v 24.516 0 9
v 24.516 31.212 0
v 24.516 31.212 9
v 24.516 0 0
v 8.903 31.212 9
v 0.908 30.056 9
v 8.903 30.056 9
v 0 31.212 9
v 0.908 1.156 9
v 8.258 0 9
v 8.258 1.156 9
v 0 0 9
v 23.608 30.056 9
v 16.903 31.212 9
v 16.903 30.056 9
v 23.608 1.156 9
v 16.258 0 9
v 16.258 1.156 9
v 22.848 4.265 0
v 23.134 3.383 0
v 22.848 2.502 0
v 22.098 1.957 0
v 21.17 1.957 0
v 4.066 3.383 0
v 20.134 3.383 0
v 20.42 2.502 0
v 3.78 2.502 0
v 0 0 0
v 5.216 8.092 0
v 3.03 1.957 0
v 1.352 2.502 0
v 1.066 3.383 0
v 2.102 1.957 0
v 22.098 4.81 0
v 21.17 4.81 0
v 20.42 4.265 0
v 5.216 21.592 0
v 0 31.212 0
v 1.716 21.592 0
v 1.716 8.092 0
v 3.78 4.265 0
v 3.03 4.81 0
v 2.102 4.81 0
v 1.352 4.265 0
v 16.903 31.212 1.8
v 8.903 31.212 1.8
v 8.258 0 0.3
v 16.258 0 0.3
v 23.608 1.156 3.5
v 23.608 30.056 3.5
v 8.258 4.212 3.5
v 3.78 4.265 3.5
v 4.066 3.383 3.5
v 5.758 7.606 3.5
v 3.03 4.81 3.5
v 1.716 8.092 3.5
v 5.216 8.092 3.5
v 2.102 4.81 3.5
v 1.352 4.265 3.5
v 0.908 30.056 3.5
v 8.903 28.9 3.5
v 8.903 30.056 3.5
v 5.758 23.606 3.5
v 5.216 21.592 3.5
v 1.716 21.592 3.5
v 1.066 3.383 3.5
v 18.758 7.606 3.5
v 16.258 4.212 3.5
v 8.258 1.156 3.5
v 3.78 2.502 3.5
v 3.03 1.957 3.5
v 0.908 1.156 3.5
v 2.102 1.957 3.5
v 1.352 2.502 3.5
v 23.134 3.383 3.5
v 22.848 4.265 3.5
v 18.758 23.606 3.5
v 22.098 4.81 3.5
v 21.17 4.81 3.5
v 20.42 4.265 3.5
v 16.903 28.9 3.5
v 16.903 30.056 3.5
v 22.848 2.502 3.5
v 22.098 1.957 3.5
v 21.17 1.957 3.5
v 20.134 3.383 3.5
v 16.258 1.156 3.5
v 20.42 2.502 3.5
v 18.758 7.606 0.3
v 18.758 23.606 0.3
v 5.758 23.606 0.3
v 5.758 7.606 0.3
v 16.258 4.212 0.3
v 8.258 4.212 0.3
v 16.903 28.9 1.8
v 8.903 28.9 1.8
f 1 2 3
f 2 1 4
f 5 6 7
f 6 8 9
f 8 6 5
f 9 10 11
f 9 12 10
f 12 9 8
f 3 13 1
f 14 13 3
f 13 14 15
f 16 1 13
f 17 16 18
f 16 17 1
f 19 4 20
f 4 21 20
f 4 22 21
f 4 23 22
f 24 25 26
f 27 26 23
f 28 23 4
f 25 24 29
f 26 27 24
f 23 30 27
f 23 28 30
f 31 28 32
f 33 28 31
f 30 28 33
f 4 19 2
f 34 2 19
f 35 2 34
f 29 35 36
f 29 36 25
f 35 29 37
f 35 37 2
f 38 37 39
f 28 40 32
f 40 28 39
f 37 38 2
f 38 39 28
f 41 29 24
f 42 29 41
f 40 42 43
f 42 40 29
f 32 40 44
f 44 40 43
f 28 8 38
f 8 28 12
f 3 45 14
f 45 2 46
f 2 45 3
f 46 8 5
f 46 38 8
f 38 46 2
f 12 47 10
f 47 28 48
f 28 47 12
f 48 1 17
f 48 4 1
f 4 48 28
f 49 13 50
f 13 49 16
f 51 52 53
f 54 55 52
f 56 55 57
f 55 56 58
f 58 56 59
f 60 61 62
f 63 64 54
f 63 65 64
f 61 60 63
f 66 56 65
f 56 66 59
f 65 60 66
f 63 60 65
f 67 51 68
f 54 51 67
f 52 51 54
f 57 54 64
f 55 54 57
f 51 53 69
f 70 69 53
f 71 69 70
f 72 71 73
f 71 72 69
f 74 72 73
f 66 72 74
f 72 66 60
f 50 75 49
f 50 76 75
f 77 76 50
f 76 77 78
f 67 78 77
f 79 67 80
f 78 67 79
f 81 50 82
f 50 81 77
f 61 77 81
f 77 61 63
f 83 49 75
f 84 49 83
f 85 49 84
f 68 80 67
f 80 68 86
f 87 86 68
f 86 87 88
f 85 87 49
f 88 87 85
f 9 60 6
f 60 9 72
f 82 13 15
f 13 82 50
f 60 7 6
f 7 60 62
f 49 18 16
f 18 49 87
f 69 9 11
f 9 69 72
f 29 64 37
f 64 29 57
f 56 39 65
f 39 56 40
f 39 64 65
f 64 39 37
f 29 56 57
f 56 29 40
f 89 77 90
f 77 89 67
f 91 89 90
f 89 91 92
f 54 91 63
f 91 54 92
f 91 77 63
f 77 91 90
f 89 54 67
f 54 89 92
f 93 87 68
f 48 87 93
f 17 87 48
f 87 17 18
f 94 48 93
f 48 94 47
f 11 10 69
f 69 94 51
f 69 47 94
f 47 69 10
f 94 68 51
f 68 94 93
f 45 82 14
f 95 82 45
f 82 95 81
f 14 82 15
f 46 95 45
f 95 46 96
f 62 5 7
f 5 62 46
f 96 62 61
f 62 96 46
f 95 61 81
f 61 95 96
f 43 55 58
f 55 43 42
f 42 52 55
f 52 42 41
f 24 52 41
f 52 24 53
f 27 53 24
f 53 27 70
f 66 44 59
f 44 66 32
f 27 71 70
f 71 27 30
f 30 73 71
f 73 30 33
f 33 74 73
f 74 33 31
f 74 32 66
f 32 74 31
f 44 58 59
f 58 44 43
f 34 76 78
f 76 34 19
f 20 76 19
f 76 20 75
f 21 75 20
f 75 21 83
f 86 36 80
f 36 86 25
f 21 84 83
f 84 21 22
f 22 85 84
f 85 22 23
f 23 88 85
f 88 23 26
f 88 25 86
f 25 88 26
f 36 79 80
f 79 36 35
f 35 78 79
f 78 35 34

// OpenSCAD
//21.55x28.01
w=22.7;
h=28.9;
z=9;
rim=0.08;
text="ftl";
fontsize=10;

difference() {
 cube([w*(1+rim),h*(1+rim),z]);

// filler    
 translate([w*rim/2,h*rim/2,3.5]){
  cube([w,h,z]);
 }    

// pin seat
 pinseatw=3.5;
 pinseath=13.5;
 translate([w*rim-0.1, h*rim*3.5, 0]){
  cube([pinseatw,pinseath,z]);
 }    

// ESP seat
 seatw=13;
 seath=16;
 translate([(w*(1+rim)/2)-(seatw/2),(h*(1+rim)/2)-(seath/2),0.3]){
  cube([seatw,seath,z]);
 }    
 
 //side door
 //translate([-0.01,h/1.8,0.3]){
 // cube([(w*rim),(h*rim*2)+1,z]);
 //}    
 
 // neoport
 neoport=8;
 translate([(w*(1+rim)/2)-(neoport/2),-0.1,0.3]){
  cube([neoport,(h*rim)+2,z]);
 }    

 // usb port
 usb_width=8;
 translate([(w*(1+rim)/1.9)-(usb_width/2),h,z*0.2]){
  cube([usb_width,(h*rim)+1,z]);
 }    
 
 // screwholes
 screw_r=1.5;
 screw_h=4;
 translate([w*(rim)+(screw_r/2),h*rim+(screw_r/1.4),0]) {
     cylinder(h=screw_h, r=screw_r, $fn=10);
 }
 translate([w*(1-rim)+(screw_r/2),h*rim+(screw_r/1.4),0]) {
     cylinder(h=screw_h, r=screw_r, $fn=10);
 }
 /*translate([w*(rim)+(screw_r/2),h*(1-rim)+(screw_r/2),0]) {
     cylinder(h=screw_h, r=screw_r, $fn=10);
 }
 translate([w*(1-rim)+(screw_r/2),h*(1-rim)+(screw_r/2),0]) {
     cylinder(h=screw_h, r=screw_r, $fn=10);
 }*/

}

// text
//translate([w/3,2,0]) {
//    linear_extrude(height = 1) {
//      text(text, size = fontsize, font = "Verdana");
//    }
//}
